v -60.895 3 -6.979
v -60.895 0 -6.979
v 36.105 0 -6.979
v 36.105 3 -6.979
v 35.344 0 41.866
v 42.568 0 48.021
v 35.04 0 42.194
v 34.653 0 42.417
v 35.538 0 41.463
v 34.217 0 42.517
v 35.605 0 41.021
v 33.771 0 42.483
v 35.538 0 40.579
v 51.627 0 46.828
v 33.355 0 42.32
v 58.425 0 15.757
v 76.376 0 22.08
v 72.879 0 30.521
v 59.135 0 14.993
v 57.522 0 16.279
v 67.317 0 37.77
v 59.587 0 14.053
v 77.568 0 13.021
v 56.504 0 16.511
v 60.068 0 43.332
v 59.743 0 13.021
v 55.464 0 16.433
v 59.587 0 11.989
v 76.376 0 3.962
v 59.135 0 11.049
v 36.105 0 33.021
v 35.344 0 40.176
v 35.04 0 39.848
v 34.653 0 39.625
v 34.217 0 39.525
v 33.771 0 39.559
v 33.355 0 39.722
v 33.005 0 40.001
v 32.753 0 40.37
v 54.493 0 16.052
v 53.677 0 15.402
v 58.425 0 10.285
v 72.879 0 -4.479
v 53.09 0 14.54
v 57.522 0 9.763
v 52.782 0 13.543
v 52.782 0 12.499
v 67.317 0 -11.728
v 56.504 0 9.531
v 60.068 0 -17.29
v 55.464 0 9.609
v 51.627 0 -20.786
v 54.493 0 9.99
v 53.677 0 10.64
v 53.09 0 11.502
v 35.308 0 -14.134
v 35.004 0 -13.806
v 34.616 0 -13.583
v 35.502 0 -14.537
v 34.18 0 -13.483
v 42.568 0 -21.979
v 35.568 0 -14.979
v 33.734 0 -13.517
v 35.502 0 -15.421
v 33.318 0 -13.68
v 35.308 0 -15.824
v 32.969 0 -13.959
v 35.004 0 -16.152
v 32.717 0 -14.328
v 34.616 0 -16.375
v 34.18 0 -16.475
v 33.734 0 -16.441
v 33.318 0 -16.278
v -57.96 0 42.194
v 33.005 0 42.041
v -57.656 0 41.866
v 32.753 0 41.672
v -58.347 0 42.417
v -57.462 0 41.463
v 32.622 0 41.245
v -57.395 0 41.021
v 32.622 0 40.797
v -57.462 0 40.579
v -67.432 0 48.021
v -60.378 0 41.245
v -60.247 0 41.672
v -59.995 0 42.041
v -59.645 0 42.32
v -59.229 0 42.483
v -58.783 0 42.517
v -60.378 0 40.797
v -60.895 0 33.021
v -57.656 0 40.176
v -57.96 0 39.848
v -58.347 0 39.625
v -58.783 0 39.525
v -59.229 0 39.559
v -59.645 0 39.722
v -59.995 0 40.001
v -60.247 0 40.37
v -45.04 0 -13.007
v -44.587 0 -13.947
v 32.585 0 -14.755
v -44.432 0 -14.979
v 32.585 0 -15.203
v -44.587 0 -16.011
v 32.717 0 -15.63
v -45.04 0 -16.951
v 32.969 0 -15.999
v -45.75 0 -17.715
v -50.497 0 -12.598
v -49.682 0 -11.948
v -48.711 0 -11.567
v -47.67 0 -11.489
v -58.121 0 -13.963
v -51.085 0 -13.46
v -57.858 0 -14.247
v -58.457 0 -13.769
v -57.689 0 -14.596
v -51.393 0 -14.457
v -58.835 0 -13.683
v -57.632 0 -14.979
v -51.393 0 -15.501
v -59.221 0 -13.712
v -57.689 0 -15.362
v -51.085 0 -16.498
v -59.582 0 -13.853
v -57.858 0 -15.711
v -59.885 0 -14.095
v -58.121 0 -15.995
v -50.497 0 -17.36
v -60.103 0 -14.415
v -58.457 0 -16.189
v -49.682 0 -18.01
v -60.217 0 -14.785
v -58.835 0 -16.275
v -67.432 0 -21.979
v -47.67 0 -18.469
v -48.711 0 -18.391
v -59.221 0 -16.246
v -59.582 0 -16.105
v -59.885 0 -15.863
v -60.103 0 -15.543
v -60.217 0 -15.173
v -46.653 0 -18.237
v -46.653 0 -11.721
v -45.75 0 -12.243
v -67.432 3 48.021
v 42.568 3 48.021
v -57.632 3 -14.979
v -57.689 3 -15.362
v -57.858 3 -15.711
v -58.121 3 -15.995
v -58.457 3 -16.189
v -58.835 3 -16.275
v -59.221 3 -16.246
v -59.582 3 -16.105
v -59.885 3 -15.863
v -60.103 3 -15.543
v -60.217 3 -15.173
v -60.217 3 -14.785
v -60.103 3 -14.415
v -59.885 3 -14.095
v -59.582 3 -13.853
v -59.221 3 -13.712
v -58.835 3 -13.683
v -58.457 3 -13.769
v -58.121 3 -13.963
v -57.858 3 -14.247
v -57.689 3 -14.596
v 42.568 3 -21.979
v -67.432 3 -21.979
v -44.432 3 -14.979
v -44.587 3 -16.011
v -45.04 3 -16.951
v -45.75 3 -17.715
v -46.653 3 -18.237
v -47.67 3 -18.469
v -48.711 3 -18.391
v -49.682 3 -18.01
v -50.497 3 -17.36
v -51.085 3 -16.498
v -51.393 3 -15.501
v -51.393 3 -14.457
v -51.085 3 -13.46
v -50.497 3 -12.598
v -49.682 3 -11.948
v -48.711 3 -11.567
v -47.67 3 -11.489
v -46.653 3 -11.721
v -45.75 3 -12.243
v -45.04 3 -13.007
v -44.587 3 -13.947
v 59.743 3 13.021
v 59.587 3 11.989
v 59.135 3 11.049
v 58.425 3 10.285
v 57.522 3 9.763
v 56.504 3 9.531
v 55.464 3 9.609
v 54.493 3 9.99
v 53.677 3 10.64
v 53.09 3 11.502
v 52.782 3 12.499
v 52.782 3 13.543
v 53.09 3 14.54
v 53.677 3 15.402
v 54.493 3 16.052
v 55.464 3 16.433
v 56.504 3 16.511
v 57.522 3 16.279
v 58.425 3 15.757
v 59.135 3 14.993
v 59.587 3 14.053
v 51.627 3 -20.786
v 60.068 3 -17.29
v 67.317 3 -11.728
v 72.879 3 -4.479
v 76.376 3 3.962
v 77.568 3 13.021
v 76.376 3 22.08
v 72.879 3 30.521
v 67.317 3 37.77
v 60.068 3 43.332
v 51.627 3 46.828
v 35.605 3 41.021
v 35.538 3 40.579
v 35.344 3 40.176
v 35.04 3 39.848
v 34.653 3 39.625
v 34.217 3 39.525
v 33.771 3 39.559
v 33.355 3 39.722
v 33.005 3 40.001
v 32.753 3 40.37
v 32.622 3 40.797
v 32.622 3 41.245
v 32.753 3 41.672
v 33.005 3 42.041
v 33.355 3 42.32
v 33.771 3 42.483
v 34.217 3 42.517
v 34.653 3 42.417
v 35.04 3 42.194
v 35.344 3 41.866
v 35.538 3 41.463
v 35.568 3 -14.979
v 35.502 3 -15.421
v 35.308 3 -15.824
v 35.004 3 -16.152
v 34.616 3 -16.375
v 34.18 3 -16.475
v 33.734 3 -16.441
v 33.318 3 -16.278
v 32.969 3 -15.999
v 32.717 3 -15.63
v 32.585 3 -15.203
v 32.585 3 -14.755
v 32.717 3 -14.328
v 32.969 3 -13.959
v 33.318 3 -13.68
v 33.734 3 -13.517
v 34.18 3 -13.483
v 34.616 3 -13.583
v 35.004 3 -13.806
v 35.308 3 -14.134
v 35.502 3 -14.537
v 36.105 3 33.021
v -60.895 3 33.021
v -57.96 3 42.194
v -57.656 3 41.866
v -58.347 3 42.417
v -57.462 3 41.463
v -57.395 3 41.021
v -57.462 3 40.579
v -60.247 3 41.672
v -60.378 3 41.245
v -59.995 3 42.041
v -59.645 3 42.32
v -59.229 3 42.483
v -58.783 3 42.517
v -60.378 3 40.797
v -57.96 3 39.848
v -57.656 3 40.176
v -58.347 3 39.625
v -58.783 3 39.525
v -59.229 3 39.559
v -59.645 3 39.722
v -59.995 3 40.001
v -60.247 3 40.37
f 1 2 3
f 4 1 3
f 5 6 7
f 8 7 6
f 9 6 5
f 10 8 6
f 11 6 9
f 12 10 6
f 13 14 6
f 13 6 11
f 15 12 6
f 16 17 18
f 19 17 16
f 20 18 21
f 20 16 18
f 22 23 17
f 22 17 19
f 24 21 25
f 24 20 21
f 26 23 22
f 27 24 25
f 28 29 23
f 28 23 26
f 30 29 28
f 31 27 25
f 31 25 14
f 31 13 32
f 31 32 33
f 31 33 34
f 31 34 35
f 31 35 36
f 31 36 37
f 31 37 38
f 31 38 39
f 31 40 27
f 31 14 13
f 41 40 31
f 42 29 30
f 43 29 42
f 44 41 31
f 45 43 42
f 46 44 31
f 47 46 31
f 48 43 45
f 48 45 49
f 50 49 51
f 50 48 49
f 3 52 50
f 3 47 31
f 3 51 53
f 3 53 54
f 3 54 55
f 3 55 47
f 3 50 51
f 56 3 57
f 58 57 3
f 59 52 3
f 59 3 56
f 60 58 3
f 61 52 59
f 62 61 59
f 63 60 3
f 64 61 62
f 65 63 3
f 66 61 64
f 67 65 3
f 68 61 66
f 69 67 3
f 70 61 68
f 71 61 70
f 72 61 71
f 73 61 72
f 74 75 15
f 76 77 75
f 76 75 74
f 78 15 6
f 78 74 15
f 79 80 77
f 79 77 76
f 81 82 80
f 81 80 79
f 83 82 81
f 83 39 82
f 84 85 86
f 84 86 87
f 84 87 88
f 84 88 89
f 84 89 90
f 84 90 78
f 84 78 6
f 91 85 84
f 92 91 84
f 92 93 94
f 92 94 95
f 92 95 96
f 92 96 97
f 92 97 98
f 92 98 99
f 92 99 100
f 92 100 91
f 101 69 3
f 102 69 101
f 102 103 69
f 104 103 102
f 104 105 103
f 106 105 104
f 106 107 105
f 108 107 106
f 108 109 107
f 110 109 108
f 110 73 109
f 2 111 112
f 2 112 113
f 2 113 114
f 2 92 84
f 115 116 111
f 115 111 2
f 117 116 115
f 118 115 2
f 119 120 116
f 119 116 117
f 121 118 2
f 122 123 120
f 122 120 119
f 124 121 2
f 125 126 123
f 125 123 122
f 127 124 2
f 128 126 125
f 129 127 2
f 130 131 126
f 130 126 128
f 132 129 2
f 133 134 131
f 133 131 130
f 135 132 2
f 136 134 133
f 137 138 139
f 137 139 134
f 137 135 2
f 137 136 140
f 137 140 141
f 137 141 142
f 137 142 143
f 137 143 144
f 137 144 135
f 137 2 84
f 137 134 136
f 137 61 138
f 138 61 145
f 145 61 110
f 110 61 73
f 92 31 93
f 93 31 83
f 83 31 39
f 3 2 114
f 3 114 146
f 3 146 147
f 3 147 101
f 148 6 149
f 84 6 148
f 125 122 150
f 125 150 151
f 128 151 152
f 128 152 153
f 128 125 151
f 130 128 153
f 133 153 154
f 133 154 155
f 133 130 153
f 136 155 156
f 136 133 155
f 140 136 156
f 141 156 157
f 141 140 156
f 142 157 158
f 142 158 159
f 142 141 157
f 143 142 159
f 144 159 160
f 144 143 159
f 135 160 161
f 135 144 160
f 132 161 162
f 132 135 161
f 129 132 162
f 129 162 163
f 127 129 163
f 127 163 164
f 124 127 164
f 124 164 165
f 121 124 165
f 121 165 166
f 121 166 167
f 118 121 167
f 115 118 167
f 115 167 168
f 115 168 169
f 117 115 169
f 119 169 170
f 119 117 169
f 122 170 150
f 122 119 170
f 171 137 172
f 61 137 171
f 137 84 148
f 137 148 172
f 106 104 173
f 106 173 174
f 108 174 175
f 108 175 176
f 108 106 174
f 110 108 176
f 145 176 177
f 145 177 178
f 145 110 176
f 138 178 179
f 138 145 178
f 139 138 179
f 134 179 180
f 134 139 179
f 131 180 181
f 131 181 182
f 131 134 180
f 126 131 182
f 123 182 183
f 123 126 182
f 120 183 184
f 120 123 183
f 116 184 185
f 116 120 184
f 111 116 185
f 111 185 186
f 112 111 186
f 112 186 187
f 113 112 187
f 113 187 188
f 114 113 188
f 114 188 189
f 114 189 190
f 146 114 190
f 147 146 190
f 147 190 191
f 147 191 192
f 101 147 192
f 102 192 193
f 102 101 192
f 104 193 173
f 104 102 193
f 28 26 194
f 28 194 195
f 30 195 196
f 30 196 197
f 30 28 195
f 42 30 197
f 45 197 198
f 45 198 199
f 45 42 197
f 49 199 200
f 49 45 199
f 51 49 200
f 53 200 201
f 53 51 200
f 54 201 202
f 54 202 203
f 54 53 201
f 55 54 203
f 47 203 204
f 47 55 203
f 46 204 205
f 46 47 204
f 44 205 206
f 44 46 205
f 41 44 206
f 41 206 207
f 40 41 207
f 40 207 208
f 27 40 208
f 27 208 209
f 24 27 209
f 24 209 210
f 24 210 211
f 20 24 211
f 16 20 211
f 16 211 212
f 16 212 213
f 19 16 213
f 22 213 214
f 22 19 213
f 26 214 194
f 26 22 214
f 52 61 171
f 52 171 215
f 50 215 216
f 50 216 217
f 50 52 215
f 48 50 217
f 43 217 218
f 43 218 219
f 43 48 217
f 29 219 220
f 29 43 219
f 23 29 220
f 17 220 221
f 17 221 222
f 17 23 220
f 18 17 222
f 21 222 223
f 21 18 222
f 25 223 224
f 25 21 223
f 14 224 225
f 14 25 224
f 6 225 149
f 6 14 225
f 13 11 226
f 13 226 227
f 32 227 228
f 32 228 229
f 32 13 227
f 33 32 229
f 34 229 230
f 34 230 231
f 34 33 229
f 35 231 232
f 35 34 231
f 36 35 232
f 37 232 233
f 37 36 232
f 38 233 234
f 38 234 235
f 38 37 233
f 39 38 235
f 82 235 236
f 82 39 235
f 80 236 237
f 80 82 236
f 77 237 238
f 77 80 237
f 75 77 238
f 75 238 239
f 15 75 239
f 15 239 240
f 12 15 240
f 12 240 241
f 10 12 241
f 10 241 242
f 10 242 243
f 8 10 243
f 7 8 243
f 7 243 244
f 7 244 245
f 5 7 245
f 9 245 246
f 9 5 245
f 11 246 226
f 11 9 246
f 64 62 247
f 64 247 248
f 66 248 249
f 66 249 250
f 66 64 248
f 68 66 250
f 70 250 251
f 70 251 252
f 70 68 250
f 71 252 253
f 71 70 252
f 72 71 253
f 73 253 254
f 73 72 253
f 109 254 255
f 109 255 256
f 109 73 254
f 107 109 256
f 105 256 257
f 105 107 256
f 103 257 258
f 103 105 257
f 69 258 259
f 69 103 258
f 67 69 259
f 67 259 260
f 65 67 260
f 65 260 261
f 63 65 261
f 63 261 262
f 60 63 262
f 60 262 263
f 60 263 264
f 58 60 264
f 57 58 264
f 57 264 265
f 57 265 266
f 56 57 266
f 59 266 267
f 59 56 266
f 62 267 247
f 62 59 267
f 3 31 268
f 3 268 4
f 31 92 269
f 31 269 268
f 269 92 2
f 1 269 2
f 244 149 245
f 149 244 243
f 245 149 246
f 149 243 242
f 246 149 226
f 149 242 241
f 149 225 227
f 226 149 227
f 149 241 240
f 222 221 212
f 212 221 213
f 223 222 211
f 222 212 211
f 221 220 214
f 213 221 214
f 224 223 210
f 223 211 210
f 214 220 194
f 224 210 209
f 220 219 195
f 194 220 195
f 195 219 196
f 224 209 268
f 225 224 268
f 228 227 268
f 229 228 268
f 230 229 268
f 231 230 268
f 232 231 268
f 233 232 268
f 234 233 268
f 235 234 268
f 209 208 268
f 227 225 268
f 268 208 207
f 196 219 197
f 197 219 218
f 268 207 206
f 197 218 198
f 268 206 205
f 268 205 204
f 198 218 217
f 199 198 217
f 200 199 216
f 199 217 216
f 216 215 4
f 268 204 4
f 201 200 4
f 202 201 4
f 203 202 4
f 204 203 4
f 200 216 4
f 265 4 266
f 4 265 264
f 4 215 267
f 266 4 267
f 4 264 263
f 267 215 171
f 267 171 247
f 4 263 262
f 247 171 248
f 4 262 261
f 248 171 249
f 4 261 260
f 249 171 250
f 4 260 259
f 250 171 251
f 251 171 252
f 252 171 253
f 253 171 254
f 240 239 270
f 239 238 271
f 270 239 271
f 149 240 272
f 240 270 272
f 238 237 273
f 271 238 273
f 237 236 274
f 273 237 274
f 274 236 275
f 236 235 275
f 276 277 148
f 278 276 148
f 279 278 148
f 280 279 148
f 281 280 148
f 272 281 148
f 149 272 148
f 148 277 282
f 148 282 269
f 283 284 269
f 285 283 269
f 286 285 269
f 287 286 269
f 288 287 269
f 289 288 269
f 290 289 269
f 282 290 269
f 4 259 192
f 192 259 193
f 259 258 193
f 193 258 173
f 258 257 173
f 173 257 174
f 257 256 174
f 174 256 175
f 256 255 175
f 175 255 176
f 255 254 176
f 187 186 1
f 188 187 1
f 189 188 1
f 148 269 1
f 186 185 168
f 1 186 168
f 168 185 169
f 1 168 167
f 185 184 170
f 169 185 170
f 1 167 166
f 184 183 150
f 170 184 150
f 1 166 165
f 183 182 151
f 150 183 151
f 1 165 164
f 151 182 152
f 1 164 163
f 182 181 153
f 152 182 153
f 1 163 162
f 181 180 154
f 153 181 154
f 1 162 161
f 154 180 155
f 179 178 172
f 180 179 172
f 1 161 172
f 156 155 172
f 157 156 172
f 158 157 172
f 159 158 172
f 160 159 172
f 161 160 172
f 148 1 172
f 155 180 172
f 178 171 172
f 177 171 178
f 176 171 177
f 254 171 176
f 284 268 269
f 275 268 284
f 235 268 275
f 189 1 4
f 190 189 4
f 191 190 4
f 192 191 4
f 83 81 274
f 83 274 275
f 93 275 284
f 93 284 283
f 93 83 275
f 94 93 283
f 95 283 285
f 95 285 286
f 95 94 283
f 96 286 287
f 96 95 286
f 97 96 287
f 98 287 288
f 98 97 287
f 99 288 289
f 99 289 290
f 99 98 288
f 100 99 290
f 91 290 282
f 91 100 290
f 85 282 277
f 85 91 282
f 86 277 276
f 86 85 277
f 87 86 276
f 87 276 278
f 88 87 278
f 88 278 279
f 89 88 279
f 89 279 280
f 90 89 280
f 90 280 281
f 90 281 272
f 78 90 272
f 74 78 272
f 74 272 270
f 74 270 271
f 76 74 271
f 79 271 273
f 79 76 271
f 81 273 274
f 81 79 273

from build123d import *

# Parameters (mm, degrees)
SKETCH1_R           = 1.3
SKETCH1_R_2         = 1.5
SKETCH1_R_3         = 3.5
SKETCH1_W           = 97
SKETCH1_H           = 40
BOSS_EXTRUDE1_DEPTH = 3


with BuildPart() as part:
    # Sketch1 → Boss-Extrude1 (new body)
    with BuildSketch(Plane(origin=(0, 0, 0), x_dir=(1, 0, 0), z_dir=(0, 1, 0))):
        with BuildLine():
            Line((-67.43171984, 21.978952762), (42.56828016, 21.978952762))
            ThreePointArc((42.56828016, 21.978952762), (77.56828016, -13.021047238), (42.56828016, -48.021047238))
            Line((42.56828016, -48.021047238), (-67.43171984, -48.021047238))
            Line((-67.43171984, -48.021047238), (-67.43171984, 21.978952762))
        make_face()
        with Locations((-58.93171984, 14.978952762)):
            Circle(SKETCH1_R, mode=Mode.SUBTRACT)
        with Locations((34.06828016, 14.978952762)):
            Circle(SKETCH1_R_2, mode=Mode.SUBTRACT)
        with Locations((-58.895119552, -41.021035277)):
            Circle(SKETCH1_R_2, mode=Mode.SUBTRACT)
        with Locations((34.104880448, -41.021035277)):
            Circle(SKETCH1_R_2, mode=Mode.SUBTRACT)
        with Locations((56.242935444, -13.021047238)):
            Circle(SKETCH1_R_3, mode=Mode.SUBTRACT)
        with Locations((-47.93171984, 14.978952762)):
            Circle(SKETCH1_R_3, mode=Mode.SUBTRACT)
        with Locations((-12.395119552, -13.021047238)):
            Rectangle(SKETCH1_W, SKETCH1_H, mode=Mode.SUBTRACT)
    extrude(amount=BOSS_EXTRUDE1_DEPTH)


solid = part.part
